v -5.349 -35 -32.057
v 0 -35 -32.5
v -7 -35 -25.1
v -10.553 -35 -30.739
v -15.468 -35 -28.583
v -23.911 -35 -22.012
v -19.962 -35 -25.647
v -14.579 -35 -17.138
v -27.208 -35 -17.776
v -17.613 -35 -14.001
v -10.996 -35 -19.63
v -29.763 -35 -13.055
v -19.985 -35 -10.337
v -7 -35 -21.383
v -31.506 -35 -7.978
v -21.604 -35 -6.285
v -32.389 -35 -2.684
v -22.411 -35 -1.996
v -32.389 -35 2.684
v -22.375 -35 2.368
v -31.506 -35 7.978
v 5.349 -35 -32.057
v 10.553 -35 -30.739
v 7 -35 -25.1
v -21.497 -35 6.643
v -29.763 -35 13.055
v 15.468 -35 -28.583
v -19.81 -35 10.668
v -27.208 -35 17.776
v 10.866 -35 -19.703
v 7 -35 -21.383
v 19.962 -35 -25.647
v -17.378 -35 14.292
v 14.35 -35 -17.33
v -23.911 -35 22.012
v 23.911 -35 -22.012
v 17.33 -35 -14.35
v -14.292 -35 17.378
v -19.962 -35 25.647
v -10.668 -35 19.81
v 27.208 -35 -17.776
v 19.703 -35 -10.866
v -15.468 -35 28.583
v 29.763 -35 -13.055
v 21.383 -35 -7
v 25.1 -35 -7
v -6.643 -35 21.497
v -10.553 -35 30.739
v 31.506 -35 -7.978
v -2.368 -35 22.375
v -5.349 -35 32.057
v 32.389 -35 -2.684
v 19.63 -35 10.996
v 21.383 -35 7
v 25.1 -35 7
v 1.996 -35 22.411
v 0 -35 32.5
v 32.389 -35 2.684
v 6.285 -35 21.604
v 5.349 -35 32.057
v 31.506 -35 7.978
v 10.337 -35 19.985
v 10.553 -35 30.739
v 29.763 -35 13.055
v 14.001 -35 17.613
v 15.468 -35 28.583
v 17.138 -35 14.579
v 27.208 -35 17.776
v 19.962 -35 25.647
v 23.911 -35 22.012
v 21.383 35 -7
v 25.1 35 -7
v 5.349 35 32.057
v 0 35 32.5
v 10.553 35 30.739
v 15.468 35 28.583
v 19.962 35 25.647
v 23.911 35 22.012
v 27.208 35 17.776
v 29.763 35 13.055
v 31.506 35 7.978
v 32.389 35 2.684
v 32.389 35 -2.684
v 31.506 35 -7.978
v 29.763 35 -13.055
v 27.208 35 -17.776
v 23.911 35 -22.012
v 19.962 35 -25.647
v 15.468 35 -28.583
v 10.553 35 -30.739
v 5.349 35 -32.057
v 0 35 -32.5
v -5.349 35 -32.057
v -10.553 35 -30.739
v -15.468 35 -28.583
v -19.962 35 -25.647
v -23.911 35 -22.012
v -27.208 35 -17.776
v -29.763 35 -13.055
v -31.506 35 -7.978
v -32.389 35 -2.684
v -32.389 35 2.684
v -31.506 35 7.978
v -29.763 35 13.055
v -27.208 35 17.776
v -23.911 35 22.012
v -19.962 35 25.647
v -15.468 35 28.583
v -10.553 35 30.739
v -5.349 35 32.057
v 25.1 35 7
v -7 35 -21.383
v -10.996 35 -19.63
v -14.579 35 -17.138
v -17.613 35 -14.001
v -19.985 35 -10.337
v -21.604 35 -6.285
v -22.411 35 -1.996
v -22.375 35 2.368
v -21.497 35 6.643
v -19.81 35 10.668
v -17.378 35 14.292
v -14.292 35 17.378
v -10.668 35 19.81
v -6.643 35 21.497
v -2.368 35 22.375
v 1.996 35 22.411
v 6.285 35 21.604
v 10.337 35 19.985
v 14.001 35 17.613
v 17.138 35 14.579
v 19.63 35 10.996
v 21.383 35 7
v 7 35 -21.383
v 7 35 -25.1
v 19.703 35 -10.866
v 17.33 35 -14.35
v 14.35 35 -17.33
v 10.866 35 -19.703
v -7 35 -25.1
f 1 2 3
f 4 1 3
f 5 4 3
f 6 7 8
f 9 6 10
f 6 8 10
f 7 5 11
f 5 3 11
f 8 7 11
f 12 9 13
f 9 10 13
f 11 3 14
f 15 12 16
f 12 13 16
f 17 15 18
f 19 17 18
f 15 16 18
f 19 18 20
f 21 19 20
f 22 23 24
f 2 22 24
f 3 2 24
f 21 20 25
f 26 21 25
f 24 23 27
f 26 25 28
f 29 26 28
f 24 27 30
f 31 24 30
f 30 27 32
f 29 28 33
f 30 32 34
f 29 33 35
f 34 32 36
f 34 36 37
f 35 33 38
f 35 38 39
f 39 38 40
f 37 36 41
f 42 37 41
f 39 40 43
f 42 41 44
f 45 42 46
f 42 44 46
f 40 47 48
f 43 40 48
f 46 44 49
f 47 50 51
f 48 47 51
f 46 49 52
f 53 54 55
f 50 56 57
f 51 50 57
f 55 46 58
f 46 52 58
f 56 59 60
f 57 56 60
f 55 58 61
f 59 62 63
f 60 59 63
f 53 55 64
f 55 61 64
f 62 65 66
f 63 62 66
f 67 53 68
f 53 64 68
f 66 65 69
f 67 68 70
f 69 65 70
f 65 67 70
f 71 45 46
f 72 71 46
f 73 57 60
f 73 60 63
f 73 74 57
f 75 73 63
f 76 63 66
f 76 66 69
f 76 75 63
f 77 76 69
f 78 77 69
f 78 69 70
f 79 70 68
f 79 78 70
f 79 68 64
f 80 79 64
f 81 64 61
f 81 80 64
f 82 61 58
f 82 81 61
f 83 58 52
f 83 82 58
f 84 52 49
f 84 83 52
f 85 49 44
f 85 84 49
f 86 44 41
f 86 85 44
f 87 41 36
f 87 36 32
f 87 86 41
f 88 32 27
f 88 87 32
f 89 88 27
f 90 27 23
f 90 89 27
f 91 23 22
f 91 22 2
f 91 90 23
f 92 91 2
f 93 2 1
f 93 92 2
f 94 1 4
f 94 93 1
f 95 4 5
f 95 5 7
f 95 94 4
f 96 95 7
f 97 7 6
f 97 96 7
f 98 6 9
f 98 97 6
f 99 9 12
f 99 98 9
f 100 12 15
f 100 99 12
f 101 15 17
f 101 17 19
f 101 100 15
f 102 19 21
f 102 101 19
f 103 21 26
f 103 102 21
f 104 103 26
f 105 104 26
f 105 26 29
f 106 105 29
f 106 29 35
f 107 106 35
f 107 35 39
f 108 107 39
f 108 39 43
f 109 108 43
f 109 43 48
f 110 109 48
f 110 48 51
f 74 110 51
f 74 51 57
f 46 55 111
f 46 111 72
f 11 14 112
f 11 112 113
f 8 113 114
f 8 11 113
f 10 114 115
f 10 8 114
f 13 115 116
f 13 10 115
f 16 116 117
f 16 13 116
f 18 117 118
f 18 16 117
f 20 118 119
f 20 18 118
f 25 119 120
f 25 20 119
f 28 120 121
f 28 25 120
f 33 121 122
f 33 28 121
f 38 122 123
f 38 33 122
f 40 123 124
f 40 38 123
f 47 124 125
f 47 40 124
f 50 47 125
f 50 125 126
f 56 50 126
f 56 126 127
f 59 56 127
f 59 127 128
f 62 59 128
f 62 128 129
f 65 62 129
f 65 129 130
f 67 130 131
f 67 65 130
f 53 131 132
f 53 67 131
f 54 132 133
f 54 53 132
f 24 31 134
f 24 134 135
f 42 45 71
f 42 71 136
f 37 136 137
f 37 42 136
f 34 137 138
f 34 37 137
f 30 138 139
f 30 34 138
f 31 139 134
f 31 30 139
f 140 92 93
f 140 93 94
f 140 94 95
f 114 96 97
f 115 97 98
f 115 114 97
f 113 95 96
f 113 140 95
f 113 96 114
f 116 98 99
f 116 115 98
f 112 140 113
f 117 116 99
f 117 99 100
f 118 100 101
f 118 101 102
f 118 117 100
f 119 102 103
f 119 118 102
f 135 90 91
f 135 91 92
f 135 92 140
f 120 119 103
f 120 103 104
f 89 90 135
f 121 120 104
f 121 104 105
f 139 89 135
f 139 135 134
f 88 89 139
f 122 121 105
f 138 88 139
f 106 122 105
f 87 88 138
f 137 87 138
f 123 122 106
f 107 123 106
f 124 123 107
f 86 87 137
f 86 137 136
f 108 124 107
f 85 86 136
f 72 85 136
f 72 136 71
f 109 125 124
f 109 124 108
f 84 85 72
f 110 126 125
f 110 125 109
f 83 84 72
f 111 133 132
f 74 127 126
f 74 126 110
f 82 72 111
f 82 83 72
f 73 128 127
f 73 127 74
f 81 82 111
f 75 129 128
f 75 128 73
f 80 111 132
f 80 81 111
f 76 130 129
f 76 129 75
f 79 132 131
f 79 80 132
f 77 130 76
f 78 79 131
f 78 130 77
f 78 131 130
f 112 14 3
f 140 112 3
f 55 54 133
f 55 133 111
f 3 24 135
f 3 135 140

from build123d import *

# Parameters (mm, degrees)
SKETCH1_R           = 32.5
SKETCH1_R_2         = 22.5
BOSS_EXTRUDE1_DEPTH = 35
SKETCH2_W           = 7
SKETCH2_H           = 14
CUT_EXTRUDE1_DEPTH  = 84.740671122
CIRPATTERN1_COUNT   = 2
CIRPATTERN1_ANGLE   = 90


with BuildPart() as part:
    # Sketch1 → Boss-Extrude1 (new, symmetric)
    with BuildSketch(Plane(origin=(0, 0, 0), x_dir=(1, 0, 0), z_dir=(0, 1, 0))):
        with Locations(Location((0, 0, 0), (0, 0, 270))):
            Circle(SKETCH1_R)
        with Locations(Location((0, 0, 0), (0, 0, 270))):
            Circle(SKETCH1_R_2, mode=Mode.SUBTRACT)
    extrude(amount=BOSS_EXTRUDE1_DEPTH, both=True)

    # Sketch2 → Cut-Extrude1 (cut, through all)
    with BuildSketch(Plane(origin=(0, 35, 0), x_dir=(1, 0, 0), z_dir=(0, 1, 0))):
        with Locations((21.6, 0)):
            Rectangle(SKETCH2_W, SKETCH2_H)
    cut_extrude1 = extrude(amount=-CUT_EXTRUDE1_DEPTH, mode=Mode.SUBTRACT)

    # CirPattern1: Cut-Extrude1 ×2 about axis
    cirpattern1_axis = Axis((0, 0, 0), (0, 1, 0))
    for i in range(1, CIRPATTERN1_COUNT):
        add(cut_extrude1.rotate(cirpattern1_axis, i * CIRPATTERN1_ANGLE / (CIRPATTERN1_COUNT - 1)), mode=Mode.SUBTRACT)


solid = part.part
